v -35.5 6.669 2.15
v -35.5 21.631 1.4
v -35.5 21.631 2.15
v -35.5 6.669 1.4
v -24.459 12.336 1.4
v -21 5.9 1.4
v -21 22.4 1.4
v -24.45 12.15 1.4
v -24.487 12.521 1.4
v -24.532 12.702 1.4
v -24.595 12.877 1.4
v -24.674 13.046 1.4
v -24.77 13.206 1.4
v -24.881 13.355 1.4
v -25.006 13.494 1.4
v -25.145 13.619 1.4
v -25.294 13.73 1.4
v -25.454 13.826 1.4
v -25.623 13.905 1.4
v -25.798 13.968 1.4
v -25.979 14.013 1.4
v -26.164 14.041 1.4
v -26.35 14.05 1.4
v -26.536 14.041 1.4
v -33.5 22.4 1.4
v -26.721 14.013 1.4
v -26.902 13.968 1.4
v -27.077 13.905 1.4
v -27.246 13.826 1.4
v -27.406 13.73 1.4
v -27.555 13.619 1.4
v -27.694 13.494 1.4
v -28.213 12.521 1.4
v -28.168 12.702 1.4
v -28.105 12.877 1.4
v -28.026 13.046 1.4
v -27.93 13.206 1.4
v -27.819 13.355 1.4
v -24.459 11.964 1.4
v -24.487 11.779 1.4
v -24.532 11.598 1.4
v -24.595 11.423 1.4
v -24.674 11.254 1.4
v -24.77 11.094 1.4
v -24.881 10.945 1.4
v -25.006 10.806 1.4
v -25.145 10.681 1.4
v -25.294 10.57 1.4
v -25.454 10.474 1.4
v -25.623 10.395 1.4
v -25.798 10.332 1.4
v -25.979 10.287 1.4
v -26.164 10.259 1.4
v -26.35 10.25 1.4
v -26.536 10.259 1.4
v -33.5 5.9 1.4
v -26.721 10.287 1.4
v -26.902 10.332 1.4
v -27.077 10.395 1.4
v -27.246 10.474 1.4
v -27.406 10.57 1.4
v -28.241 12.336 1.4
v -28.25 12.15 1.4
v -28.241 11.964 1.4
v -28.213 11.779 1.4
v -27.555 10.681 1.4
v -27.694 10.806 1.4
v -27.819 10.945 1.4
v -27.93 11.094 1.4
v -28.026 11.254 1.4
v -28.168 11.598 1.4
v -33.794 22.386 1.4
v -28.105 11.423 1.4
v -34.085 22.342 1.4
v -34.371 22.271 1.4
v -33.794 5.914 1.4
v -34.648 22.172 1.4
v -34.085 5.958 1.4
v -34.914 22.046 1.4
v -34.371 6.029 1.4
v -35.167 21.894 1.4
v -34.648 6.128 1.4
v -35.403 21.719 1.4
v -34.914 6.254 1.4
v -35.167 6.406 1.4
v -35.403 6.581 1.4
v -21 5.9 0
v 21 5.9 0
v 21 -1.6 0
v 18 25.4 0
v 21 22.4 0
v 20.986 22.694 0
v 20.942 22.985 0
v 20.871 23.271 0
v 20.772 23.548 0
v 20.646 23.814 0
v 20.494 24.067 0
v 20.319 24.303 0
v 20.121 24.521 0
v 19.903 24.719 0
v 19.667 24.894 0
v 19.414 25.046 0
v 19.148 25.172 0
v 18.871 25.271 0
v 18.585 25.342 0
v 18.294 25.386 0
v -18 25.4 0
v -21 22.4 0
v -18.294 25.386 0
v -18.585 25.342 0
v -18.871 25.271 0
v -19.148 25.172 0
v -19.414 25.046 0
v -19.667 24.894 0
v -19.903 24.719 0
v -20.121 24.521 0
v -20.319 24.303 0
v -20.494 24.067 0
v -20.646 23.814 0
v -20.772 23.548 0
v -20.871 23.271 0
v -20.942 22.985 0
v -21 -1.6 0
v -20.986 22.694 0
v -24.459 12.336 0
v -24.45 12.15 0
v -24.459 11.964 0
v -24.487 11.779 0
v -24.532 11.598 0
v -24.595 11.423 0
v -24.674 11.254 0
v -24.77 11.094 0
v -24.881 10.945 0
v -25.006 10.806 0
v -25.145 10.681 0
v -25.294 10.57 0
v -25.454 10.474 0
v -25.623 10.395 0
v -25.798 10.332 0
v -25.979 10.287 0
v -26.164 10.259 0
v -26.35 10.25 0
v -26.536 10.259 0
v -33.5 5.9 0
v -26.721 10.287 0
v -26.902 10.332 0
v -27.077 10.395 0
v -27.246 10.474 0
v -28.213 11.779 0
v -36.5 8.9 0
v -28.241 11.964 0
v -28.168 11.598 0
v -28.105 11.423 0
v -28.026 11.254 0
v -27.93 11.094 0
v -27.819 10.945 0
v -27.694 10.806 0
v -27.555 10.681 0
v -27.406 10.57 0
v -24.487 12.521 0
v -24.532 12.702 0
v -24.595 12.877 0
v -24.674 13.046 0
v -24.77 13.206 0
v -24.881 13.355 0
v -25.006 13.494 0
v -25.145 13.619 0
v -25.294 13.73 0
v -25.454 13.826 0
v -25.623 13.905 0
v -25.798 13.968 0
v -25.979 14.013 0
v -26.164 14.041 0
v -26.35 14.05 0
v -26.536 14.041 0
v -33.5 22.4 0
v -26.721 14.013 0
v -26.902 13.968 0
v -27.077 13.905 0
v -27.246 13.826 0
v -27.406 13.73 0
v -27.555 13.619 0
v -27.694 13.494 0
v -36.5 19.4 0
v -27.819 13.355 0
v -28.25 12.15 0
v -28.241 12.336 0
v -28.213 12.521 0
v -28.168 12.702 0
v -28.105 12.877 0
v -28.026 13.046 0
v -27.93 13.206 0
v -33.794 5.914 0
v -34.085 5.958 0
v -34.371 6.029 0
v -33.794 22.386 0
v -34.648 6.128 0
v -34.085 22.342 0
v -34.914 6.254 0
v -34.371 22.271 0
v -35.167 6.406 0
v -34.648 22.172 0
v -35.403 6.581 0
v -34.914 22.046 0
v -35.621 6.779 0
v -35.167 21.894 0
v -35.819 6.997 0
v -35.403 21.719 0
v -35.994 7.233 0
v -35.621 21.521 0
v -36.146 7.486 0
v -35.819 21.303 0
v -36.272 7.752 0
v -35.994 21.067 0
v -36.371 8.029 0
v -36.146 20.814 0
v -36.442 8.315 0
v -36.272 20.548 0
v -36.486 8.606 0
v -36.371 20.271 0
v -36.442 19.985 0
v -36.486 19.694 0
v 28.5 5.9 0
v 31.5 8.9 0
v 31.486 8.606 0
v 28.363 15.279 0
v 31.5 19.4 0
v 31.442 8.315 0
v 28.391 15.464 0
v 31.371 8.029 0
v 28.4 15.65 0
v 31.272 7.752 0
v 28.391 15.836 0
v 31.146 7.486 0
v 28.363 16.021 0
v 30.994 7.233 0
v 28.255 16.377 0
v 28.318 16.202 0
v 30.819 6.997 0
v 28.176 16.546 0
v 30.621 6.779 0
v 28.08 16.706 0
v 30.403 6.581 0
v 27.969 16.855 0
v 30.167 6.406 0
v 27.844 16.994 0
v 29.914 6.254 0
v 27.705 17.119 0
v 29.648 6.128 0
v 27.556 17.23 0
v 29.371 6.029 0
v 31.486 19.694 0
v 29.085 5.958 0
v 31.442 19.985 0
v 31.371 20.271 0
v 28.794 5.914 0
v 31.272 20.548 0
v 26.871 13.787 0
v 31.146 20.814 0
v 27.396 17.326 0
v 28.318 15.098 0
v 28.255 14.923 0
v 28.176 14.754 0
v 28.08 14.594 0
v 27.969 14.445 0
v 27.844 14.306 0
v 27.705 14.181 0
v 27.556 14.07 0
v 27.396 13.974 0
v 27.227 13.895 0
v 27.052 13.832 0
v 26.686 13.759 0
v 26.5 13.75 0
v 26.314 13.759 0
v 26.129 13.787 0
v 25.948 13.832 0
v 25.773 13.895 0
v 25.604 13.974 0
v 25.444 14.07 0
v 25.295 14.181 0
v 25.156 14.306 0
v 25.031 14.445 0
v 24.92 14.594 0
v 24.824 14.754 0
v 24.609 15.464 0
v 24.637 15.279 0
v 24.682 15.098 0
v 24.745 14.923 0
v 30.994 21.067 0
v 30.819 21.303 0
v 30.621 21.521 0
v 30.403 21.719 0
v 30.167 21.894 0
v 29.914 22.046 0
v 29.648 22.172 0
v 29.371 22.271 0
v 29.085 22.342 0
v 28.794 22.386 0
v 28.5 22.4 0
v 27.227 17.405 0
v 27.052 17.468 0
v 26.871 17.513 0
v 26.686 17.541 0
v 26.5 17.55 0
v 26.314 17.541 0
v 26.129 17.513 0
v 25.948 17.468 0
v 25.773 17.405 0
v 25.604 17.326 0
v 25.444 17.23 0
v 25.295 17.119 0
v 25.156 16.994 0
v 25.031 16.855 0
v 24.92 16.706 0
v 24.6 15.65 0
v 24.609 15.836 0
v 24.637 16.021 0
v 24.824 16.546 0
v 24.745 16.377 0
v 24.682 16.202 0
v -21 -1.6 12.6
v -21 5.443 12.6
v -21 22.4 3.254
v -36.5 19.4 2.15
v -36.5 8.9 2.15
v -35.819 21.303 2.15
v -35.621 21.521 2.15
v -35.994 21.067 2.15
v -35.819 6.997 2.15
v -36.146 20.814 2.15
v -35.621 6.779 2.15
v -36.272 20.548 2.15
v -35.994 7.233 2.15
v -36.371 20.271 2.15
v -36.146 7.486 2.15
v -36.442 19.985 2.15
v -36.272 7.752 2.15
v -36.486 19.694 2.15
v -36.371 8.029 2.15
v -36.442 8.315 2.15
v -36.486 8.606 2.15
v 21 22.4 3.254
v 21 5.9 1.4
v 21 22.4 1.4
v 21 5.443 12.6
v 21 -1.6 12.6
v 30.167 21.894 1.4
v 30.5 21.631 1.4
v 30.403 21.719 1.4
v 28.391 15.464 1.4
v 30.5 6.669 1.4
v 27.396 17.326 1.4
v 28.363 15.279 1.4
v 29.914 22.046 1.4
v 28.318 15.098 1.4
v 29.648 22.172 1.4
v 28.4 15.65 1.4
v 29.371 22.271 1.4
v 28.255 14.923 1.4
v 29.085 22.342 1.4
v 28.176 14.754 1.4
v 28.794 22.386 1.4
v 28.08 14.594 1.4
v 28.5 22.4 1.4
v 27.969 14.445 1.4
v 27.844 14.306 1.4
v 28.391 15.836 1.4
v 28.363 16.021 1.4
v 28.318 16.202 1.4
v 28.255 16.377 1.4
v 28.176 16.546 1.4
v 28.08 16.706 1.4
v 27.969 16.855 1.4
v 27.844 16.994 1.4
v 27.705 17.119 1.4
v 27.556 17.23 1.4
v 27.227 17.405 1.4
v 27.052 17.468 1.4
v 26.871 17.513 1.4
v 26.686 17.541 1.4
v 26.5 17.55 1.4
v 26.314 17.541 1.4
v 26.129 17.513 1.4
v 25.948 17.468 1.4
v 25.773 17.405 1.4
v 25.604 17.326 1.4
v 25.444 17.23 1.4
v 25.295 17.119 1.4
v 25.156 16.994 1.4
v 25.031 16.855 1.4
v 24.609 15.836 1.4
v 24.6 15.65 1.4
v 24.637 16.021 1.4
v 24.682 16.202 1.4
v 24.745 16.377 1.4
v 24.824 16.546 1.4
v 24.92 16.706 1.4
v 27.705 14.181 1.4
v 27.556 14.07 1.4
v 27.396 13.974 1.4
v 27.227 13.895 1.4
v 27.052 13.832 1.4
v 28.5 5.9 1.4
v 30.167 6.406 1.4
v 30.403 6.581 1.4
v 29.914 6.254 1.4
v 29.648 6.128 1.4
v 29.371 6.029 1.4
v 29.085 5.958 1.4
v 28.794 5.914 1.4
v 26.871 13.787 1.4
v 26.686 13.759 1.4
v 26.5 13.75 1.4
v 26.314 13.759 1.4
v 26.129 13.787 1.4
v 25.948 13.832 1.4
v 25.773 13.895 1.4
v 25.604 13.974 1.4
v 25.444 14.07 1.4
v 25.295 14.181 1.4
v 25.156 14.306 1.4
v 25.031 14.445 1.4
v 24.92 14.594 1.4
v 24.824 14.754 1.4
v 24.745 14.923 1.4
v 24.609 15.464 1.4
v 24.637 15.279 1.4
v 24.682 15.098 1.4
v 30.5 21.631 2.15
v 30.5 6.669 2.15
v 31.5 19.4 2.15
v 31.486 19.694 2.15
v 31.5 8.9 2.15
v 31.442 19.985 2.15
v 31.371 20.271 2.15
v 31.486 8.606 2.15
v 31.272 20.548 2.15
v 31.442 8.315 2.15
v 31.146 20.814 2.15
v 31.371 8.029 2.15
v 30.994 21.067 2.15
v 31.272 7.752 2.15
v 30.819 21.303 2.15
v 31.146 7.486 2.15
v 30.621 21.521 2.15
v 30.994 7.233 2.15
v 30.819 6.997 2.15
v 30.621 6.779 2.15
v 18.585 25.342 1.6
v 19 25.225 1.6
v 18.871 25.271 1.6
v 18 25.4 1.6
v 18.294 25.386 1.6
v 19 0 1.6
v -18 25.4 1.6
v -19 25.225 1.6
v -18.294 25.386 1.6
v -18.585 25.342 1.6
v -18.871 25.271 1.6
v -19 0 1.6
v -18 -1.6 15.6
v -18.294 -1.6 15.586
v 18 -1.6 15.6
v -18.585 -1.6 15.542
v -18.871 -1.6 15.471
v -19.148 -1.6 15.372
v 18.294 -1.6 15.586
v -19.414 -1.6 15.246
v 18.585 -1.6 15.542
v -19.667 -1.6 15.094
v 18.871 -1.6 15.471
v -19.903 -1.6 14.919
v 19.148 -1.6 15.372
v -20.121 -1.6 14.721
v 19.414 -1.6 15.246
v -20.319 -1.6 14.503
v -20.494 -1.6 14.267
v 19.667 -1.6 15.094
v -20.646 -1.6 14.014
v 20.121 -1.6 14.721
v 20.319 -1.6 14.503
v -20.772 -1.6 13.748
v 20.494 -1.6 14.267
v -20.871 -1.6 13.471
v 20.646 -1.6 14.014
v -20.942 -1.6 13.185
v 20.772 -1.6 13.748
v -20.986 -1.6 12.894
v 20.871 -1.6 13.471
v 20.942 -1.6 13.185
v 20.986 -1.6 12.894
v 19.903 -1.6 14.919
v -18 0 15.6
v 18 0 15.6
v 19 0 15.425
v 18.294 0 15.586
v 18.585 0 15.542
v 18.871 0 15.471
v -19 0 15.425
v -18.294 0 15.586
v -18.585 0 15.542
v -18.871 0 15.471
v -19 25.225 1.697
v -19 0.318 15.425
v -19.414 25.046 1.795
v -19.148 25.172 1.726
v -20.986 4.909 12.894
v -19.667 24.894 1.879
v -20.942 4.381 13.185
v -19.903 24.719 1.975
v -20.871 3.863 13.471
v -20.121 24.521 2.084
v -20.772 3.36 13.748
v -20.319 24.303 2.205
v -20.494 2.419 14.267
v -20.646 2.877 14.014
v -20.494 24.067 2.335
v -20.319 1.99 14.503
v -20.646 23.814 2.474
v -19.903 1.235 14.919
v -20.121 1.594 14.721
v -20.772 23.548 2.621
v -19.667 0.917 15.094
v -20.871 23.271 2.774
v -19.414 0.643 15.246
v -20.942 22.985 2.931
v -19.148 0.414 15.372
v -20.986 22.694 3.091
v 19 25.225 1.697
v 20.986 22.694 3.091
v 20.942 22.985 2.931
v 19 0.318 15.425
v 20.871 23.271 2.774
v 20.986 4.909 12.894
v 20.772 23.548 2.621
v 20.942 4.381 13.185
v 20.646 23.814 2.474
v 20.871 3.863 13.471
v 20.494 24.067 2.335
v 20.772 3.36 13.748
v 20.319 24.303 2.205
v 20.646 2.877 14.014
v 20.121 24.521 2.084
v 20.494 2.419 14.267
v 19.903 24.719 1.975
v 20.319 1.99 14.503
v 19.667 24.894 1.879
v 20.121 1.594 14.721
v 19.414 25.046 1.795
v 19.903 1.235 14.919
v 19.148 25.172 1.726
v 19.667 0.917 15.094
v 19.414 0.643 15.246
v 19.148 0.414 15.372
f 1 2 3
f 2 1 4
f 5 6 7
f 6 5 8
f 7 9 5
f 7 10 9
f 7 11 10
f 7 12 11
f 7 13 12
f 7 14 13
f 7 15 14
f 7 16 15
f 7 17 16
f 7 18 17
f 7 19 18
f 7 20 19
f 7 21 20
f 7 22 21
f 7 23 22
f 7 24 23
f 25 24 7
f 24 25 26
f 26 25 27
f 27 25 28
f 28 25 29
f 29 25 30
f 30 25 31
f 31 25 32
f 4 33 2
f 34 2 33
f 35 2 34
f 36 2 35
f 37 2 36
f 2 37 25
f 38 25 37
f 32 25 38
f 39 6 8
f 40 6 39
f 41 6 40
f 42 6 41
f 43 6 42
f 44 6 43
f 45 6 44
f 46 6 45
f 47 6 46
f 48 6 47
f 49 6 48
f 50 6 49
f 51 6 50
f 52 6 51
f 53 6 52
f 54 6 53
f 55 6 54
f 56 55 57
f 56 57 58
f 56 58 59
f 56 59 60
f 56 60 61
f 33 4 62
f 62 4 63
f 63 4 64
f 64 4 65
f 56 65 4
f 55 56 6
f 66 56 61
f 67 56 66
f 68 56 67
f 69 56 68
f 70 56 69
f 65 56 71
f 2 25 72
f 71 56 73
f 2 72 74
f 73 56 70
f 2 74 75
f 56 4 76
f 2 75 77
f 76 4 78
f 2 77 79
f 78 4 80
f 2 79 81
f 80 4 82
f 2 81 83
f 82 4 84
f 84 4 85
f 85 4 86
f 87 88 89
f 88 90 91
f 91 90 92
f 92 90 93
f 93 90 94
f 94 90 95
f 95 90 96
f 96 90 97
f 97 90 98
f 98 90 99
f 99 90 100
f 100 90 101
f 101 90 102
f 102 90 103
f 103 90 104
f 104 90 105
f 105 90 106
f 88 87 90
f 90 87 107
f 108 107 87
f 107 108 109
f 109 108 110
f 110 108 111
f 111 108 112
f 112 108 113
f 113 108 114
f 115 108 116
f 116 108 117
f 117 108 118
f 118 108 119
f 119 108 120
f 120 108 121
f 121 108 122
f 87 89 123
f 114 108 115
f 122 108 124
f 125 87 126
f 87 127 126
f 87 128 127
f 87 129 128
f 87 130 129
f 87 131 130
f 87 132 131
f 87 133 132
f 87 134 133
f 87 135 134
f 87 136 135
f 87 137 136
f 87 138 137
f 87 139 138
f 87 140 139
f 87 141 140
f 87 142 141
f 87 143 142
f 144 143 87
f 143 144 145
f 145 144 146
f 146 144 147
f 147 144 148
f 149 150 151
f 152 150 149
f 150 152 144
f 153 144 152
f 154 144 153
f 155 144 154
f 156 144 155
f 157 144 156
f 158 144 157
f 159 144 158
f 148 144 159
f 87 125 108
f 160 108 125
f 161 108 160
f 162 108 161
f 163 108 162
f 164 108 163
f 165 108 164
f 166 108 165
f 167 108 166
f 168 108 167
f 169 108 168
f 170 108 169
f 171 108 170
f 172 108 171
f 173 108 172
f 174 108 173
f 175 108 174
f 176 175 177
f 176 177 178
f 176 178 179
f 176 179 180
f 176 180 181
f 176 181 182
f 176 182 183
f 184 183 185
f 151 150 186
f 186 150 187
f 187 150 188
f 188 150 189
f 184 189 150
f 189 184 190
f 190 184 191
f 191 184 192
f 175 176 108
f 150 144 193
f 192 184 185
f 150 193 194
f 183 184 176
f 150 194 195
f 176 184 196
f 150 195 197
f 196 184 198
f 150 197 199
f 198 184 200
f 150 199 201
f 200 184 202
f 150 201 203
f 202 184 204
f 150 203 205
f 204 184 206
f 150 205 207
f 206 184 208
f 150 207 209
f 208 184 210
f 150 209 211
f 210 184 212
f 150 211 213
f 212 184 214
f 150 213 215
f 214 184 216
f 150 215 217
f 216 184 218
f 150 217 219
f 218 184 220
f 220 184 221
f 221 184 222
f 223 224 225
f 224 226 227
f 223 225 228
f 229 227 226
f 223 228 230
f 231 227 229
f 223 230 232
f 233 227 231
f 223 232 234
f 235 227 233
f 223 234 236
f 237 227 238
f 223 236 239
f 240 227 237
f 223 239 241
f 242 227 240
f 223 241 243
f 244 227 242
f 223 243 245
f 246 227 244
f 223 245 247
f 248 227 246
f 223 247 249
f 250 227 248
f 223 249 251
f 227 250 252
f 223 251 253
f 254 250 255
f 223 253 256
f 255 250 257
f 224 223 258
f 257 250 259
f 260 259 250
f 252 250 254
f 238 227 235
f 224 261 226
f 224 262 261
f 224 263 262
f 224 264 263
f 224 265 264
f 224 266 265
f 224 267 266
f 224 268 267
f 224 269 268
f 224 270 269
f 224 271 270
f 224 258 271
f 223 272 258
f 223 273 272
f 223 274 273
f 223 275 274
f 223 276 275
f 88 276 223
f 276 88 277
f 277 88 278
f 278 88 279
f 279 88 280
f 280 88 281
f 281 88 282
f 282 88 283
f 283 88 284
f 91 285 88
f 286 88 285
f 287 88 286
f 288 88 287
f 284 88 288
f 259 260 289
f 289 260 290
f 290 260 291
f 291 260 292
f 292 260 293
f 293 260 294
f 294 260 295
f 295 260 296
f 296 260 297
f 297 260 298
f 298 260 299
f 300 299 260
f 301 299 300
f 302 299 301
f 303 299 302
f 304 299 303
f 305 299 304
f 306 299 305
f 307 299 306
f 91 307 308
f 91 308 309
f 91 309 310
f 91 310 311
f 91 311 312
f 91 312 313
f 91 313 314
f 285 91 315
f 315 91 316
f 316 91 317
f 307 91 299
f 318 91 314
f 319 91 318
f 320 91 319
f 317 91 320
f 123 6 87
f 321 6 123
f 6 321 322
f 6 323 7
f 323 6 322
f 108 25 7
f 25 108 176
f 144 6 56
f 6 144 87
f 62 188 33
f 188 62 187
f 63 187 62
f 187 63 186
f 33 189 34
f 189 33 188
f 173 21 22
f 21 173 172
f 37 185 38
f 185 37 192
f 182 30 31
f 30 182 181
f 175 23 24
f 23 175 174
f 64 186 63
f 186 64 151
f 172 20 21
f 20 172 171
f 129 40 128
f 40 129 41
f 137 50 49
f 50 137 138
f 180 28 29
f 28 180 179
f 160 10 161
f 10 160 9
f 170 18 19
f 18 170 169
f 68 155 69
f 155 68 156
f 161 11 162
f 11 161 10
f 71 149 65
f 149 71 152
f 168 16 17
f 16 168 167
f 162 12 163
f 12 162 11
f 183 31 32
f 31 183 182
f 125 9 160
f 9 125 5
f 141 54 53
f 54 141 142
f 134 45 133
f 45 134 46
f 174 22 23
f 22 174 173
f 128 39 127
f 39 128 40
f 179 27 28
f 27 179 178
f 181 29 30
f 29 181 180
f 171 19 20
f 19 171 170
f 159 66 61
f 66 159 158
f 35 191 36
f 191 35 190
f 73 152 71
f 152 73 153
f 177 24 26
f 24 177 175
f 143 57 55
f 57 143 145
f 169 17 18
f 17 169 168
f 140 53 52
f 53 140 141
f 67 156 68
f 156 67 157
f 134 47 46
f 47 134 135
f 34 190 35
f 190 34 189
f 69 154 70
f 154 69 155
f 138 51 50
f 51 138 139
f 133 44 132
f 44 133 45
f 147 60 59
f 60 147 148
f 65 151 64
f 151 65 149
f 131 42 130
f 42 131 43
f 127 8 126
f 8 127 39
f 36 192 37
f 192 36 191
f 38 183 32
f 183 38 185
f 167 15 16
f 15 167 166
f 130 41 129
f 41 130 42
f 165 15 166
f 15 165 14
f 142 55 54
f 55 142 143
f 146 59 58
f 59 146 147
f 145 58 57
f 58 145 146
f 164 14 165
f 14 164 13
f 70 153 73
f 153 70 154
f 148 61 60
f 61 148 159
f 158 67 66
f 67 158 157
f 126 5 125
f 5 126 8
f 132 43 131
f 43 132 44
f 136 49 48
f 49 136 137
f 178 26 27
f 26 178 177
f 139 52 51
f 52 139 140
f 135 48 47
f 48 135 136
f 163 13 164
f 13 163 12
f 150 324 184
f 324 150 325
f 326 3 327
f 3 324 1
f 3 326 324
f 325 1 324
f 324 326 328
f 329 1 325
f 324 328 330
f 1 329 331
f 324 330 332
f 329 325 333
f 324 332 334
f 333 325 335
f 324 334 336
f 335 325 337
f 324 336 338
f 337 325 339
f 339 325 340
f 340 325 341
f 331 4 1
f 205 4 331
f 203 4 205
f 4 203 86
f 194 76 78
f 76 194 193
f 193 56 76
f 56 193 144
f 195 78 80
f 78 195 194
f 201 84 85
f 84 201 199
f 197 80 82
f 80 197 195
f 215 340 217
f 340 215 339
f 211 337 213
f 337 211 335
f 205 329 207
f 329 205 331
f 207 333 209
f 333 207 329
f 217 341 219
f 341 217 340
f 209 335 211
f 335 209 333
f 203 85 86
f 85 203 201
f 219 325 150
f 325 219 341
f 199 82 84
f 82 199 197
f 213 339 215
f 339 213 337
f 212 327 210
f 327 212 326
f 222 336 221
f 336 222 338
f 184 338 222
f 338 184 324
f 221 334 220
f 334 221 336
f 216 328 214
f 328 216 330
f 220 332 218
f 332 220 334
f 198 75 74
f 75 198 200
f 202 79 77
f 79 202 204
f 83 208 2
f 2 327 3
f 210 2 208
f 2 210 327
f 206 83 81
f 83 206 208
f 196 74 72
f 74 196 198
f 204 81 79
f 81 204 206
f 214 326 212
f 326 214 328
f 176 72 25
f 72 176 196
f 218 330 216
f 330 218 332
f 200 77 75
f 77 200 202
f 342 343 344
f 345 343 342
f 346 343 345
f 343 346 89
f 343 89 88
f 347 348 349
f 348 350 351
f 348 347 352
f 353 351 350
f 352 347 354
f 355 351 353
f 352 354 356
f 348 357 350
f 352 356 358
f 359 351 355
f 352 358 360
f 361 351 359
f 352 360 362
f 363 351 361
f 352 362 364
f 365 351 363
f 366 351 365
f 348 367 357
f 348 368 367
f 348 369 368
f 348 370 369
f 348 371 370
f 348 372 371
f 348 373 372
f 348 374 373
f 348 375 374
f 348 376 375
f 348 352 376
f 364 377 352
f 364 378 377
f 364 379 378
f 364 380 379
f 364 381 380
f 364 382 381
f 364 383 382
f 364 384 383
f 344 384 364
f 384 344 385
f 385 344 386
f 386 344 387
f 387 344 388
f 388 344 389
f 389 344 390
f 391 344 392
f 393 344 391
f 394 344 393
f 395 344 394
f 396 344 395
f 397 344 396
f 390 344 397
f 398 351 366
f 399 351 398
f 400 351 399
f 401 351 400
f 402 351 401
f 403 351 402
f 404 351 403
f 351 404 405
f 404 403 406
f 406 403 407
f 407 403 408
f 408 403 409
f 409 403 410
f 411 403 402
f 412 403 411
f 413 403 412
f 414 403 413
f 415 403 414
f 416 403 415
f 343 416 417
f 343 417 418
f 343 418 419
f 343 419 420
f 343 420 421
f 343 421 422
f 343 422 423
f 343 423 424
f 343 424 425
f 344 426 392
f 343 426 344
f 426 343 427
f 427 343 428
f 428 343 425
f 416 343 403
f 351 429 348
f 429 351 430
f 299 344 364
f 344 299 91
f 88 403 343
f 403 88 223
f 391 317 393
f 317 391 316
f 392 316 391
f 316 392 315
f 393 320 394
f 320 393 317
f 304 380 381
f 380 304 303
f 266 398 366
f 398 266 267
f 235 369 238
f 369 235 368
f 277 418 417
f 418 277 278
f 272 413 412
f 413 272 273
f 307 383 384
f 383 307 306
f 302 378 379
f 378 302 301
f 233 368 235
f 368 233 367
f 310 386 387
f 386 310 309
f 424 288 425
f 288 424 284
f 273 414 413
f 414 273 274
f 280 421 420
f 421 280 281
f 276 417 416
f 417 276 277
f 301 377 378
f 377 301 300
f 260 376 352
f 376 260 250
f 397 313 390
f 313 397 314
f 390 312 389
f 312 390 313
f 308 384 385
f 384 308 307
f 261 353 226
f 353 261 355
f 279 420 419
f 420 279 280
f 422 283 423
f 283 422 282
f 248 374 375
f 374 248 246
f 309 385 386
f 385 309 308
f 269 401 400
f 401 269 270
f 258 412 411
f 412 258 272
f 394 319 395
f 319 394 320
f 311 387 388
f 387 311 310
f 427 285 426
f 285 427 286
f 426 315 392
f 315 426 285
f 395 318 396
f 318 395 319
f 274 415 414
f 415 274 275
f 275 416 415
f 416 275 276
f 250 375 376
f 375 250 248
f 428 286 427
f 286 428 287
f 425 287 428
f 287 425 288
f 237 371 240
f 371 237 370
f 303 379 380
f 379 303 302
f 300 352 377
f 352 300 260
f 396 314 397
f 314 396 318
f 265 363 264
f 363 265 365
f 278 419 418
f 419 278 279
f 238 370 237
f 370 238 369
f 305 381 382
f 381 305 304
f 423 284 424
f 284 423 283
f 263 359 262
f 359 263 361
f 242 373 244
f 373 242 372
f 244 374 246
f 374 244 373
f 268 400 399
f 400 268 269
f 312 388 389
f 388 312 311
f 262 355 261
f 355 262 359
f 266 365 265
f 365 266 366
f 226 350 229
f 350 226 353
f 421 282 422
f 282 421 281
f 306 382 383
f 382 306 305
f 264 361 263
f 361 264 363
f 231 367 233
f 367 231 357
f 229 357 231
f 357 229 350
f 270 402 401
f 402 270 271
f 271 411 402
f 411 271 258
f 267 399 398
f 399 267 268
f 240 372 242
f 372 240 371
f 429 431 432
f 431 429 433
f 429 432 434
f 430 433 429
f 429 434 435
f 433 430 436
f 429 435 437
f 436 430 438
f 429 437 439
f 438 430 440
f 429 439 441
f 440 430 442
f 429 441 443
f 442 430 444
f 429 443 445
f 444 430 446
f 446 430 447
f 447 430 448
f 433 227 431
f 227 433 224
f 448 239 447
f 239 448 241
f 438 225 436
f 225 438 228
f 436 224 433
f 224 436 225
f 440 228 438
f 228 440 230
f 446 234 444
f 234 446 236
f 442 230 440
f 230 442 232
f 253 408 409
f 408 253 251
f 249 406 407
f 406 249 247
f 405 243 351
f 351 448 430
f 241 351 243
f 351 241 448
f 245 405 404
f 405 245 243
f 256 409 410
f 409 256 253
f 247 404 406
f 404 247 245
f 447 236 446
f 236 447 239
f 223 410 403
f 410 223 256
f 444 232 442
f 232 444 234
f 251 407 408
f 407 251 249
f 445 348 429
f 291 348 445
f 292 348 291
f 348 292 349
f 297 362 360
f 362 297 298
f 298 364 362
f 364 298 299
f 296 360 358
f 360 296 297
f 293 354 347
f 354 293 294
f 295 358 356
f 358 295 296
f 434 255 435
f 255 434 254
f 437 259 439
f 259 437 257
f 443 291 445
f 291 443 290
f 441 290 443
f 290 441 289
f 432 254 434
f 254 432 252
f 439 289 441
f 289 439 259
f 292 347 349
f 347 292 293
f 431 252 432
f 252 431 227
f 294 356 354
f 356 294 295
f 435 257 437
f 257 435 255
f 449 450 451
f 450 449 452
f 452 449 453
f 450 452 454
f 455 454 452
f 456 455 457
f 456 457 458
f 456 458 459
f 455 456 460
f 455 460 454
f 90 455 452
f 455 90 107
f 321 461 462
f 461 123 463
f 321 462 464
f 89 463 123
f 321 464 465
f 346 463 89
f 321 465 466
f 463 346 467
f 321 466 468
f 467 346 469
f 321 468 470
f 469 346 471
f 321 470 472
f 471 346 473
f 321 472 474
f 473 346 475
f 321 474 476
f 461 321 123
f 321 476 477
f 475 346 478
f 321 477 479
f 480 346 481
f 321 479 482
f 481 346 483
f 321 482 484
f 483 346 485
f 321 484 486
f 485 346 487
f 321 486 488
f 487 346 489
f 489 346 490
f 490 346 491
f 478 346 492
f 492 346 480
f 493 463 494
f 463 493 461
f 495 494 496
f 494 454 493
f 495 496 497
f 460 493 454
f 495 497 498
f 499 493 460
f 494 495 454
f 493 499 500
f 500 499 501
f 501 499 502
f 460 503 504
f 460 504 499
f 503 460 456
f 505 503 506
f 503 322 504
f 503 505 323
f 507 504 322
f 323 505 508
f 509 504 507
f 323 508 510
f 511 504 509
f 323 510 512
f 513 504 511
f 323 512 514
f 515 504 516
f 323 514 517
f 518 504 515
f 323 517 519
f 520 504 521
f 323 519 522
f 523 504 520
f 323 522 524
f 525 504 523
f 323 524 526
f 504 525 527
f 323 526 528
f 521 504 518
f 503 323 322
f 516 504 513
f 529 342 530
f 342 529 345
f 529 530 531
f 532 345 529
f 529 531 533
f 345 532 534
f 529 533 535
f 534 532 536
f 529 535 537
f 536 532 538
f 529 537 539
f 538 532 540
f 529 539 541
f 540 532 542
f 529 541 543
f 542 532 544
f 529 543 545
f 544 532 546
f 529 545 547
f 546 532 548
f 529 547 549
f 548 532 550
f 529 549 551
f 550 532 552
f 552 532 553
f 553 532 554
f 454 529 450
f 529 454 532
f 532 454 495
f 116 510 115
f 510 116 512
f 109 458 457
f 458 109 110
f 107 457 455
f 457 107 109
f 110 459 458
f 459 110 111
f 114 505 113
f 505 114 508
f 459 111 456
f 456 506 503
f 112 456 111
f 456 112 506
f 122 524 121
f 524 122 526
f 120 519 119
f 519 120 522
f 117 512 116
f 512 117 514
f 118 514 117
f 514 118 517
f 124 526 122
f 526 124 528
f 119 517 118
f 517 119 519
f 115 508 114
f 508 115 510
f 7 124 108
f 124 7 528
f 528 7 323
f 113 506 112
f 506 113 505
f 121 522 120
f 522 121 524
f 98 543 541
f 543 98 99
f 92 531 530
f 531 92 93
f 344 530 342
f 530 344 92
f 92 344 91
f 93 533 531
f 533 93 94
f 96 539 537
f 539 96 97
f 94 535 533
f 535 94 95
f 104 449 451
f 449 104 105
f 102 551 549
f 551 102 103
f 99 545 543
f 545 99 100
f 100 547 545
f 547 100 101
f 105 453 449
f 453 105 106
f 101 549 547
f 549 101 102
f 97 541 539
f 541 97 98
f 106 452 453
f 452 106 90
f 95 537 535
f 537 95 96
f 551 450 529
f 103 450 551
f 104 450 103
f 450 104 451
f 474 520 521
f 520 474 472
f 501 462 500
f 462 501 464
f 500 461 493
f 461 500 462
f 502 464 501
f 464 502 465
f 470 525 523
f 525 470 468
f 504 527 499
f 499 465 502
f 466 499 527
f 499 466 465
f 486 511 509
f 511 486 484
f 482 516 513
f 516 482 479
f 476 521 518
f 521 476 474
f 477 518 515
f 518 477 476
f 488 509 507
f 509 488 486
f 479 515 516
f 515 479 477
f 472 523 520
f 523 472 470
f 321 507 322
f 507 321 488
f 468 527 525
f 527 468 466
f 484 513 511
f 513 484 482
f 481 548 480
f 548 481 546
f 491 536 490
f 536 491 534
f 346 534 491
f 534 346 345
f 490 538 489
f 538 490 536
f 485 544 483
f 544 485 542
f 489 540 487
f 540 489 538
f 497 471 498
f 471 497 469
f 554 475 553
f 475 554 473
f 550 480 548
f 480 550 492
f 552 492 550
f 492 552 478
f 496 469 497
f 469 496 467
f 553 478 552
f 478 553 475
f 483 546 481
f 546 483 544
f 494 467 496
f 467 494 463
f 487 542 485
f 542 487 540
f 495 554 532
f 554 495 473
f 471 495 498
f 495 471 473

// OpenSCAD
// file: hash.scad
//
// Copyright (c) Stewart H. Whitman, 2020.
//
// File:    hash.scad
// Project: General
// License: CC BY-NC-SA 4.0 (Attribution-NonCommercial-ShareAlike)
// Desc:    Implementation of a hash structure.
//

// hash can be initialized like:
//
//   hash_v = hash_add( hash_add( hash_initialize(), "key1", "value1" ), "key2", value2 );
//
// or perhaps more clearly like:
//
//   hash_v = [
//     [ "key1", "value1" ],
//     [ "key2", value2 ],
//   ];
//
// Then values can be retrieved by:
//
//   v = hash_get( hash_v, "key1" );
//

// hash_initialize:
//
// Returns initialization of a hash.
//
function hash_initialize() = [];

// hash_add:
//
// Adds <key>:<value> to <hash>. This does not check for duplicates. Use hash_set to remove duplicates.
//
function hash_add( hash, key, value ) = assert( is_list(hash) ) concat( hash, [[key, value]] );

// hash_size:
//
// Returns the size of <hash>.
//
function hash_size( hash ) = assert( is_list(hash) ) len(hash);

// hash_is_empty:
//
// Returns true if <hash> is empty.
//
function hash_is_empty( hash ) = assert( is_list(hash) ) len(hash) == 0;

// hash_keys:
//
// Return the keys of <hash> in an array.
//
function hash_keys( hash ) = assert( is_list(hash) ) [ for( i = hash ) i[0] ]; 

// hash_values:
//
// Return the values of <hash> in an array.
//
function hash_values( hash ) = assert( is_list(hash) ) [ for( i = hash ) i[1] ]; 

// hash_get:
//
// Returns the value associated with key <key> from <hash> or undef if it does not exist.
//
function hash_get( hash, key ) = assert( is_list(hash) ) [ for( i = hash ) if( key == i[0] ) i[1] ][0];

// hash_exists:
//
// Returns true if the key <key> exists in <hash>.
//
function hash_exists( hash, key ) = assert( is_list(hash) ) len( [ for( i = hash ) if( key == i[0] ) true ] ) != 0;

// hash_get_default:
//
// Returns the value associated with key <key> from <hash> or <default_value> if it does not exist.
//
function hash_get_default( hash, key, default_value ) = hash_exists( hash, key ) ? hash_get( hash, key ) : default_value; 

// hash_get_default_hash:
//
// Returns the value associated with key <key> from <hash>, falling back to <default_hash> if it does not exist.
//
function hash_get_default_hash( hash, key, default_hash ) = hash_exists( hash, key ) ? hash_get( hash, key ) : hash_get( default_hash, key ); 

// hash_delete:
//
// Deletes key <key> from <hash> if it exists and returns the new hash.
//
function hash_delete( hash, key ) = assert( is_list(hash) ) [ for( i = hash ) if( key != i[0] ) i ];

// hash_set:
//
// Set key <key> to associated <value> in <hash>, deleting it if it already exists,  and returns the new hash.
//
function hash_set( hash, key, value ) = hash_exists( hash, key ) ? hash_add( hash_delete( hash, key ), key, value ) : hash_add( hash, key, value );
// file: smidge.scad
//
// Copyright (c) Stewart H. Whitman, 2020.
//
// File:    smidge.scad
// Project: General
// License: CC BY-NC-SA 4.0 (Attribution-NonCommercial-ShareAlike)
// Desc:    SMIDGE constant used in preview mode.
//

// Smidge constant for rendering only (to avoid Z-axis fighting, etc.)
SMIDGE = $preview ? 0.001 : 0;
// file: primitives.scad
//
// Copyright (c) Stewart H. Whitman, 2020.
//
// File:    primitives.scad
// Project: Dell Wyse 5070 2nd Ethernet Adapter Adapter
// License: CC BY-NC-SA 4.0 (Attribution-NonCommercial-ShareAlike)
// Desc:    Shape primitives
//
// $Header$
//

include <smidge.scad>;

// Creates a right triangle with <height> and <base> and extrudes it
// to <thickness>.
//
module right_triangle(height, base, thickness) {
  translate( [+thickness,0,0] ) rotate( [0,-90,0] ) linear_extrude( height=thickness ) polygon( [[0,0], [0,height], [base,0]] );
} // end right_triangle

// Create a half cylinder
module half_cylinder(r,h,center=false) {
  translate( [center ? -h/2 : 0, 0, 0] )
    rotate( [90,0,0] ) rotate( [0,90,0] )
    difference() {
      cylinder( r=r, h=h );
      translate( [-2*r,-r, -SMIDGE ] ) cube( [ 2*r,2*r,h+2*SMIDGE] );
    }
} // end half_cylinder

// Create a triangle with 2 sides the same
module equi_triangle(height_and_base, thickness,center=false) {
  translate( [ center ? -thickness/2 : 0, 0, 0 ] ) {
    right_triangle(height_and_base, height_and_base, thickness);
    mirror( [0,0,1] ) right_triangle(height_and_base, height_and_base, thickness);
  }
} // end equi_triangle

// Create a somewhat complex tang (a right triangle over a cube)
module tang(l,h,w,percent=25,center=false) {
  assert( percent > 0 && percent < 100 );
  //echo( ["tang",l,w,h,percent] );

  p = percent/100;

  translate( [-w/2,0,center?-h/2 : 0] ) {
    translate( [0,0,p*h] )
      right_triangle(l,(1-p)*h,w);
    cube( [w,l,p*h] );
  }
} // end tang

// Create a somewhat complex tang (a right triangle over another triangle)
module tang2(l,h,w,percent=25,center=false) {
  assert( percent > 0 && percent < 100 );
  //echo( ["tang2",l,h,w,percent] );

  p = percent/100;

  translate( [-w/2,0,center?-h/2 : 0] ) {
    translate( [0,0,p*h] )
      right_triangle(l,(1-p)*h,w);
    translate( [0,0,p*h] )
      mirror( [0,0,1] ) right_triangle(l,p*h,w);
  }
} // end tang2

// Create a gusset (pyramid that fits in corner)
module gusset(width,height=0,center=true) {
  w = width;
  h = height == 0 ? w : height;
  translate( [0,0,center?-h/2:0] )
    polyhedron( points=[[0,0,0], [w,0,h], [0,0,h], [0,w,h]],
                faces=[[1,2,3],[0,1,3],[0,2,1],[0,3,2]] );
} // end gusset

// A corner rounding shape for a designated corner (on the XY plane)...
module round_corner_xy(radius,v,direction) {
  assert( direction >= 0 && direction <= 3 );

  if( radius > 0 ) {
    // Additional amount on Z
    z_multiplier = 2;
    z_translate  = [ [-1, -1, 0], [+1, -1, 0], [+1, +1, 0], [-1, +1, 0] ];

    // Get an inverted quarter pie slice
    color( "purple" )
    translate( [v.x,v.y,0] )
      translate( z_translate[direction]*radius )
	rotate( [0,0,90*direction] )
	  difference() {
	    translate( [0,0,-v.z*z_multiplier/4] ) cube( [radius+SMIDGE,radius+SMIDGE,v.z*z_multiplier] );
	    translate( [0,0,v.z*z_multiplier/4] ) cylinder( v.z*z_multiplier+SMIDGE, r=radius, center=true );
	  }
  }
} // end round_corner_xy

// A corner rounding shape for a designated corner (on the YZ plane)...
module round_corner_yz(radius,v,direction) {
  assert( direction >= 0 && direction <= 3 );

  if( radius > 0 ) {
    // Additional amount on X
    x_multiplier = 2;
    x_translate  = [ [0, -1, +1], [0, -1, -1], [0, +1, -1], [0, +1, +1] ];

    // Get an inverted quarter pie slice
    color( "purple" )
      translate( [0,v.y,v.z] )
	translate( x_translate[direction]*radius )
	  rotate( [90*direction,0,0] )
	  rotate( [0,90,0] )
	    difference() {
	      translate( [0,0,-v.x*x_multiplier/4] ) cube( [radius+SMIDGE,radius+SMIDGE,v.x*x_multiplier] );
	      translate( [0,0,v.x*x_multiplier/4] ) cylinder( v.x*x_multiplier+SMIDGE, r=radius, center=true );
	    }
  }
} // end round_corner_yz

// A corner rounding shape for a designated corner (on the XZ plane)...
module round_corner_xz(radius,v,direction) {
  assert( direction >= 0 && direction <= 3 );

  if( radius > 0 ) {
    // Additional amount on Y
    y_multiplier = 2;
    y_translate  = [ [-1, 0, -1], [-1, 0, +1], [+1, 0, +1], [+1, 0, -1] ];

    // Get an inverted quarter pie slice
    color( "purple" )
      translate( [v.x,0,v.z] )
	translate( y_translate[direction]*radius )
	  rotate( [0,90*direction,0] )
	  rotate( [90,0,0] )
	    difference() {
	      translate( [0,0,-v.y*y_multiplier/4] ) cube( [radius+SMIDGE,radius+SMIDGE,v.y*y_multiplier] );
	      translate( [0,0,v.y*y_multiplier/4] ) cylinder( v.y*y_multiplier+SMIDGE, r=radius, center=true );
	    }
  }
} // end round_corner_xz
// main file
//
// Copyright (c) Stewart H. Whitman, 2020.
//
// File:    wyse-filler.scad
// Project: Dell Wyse 5070 2nd Ethernet Adapter Adapter
// License: CC BY-NC-SA 4.0 (Attribution-NonCommercial-ShareAlike)
// Desc:    Blank to fill an uncovered slot
//

use <wyse-blank.scad>

// Filler
Wyse_Filler($fn=64);
